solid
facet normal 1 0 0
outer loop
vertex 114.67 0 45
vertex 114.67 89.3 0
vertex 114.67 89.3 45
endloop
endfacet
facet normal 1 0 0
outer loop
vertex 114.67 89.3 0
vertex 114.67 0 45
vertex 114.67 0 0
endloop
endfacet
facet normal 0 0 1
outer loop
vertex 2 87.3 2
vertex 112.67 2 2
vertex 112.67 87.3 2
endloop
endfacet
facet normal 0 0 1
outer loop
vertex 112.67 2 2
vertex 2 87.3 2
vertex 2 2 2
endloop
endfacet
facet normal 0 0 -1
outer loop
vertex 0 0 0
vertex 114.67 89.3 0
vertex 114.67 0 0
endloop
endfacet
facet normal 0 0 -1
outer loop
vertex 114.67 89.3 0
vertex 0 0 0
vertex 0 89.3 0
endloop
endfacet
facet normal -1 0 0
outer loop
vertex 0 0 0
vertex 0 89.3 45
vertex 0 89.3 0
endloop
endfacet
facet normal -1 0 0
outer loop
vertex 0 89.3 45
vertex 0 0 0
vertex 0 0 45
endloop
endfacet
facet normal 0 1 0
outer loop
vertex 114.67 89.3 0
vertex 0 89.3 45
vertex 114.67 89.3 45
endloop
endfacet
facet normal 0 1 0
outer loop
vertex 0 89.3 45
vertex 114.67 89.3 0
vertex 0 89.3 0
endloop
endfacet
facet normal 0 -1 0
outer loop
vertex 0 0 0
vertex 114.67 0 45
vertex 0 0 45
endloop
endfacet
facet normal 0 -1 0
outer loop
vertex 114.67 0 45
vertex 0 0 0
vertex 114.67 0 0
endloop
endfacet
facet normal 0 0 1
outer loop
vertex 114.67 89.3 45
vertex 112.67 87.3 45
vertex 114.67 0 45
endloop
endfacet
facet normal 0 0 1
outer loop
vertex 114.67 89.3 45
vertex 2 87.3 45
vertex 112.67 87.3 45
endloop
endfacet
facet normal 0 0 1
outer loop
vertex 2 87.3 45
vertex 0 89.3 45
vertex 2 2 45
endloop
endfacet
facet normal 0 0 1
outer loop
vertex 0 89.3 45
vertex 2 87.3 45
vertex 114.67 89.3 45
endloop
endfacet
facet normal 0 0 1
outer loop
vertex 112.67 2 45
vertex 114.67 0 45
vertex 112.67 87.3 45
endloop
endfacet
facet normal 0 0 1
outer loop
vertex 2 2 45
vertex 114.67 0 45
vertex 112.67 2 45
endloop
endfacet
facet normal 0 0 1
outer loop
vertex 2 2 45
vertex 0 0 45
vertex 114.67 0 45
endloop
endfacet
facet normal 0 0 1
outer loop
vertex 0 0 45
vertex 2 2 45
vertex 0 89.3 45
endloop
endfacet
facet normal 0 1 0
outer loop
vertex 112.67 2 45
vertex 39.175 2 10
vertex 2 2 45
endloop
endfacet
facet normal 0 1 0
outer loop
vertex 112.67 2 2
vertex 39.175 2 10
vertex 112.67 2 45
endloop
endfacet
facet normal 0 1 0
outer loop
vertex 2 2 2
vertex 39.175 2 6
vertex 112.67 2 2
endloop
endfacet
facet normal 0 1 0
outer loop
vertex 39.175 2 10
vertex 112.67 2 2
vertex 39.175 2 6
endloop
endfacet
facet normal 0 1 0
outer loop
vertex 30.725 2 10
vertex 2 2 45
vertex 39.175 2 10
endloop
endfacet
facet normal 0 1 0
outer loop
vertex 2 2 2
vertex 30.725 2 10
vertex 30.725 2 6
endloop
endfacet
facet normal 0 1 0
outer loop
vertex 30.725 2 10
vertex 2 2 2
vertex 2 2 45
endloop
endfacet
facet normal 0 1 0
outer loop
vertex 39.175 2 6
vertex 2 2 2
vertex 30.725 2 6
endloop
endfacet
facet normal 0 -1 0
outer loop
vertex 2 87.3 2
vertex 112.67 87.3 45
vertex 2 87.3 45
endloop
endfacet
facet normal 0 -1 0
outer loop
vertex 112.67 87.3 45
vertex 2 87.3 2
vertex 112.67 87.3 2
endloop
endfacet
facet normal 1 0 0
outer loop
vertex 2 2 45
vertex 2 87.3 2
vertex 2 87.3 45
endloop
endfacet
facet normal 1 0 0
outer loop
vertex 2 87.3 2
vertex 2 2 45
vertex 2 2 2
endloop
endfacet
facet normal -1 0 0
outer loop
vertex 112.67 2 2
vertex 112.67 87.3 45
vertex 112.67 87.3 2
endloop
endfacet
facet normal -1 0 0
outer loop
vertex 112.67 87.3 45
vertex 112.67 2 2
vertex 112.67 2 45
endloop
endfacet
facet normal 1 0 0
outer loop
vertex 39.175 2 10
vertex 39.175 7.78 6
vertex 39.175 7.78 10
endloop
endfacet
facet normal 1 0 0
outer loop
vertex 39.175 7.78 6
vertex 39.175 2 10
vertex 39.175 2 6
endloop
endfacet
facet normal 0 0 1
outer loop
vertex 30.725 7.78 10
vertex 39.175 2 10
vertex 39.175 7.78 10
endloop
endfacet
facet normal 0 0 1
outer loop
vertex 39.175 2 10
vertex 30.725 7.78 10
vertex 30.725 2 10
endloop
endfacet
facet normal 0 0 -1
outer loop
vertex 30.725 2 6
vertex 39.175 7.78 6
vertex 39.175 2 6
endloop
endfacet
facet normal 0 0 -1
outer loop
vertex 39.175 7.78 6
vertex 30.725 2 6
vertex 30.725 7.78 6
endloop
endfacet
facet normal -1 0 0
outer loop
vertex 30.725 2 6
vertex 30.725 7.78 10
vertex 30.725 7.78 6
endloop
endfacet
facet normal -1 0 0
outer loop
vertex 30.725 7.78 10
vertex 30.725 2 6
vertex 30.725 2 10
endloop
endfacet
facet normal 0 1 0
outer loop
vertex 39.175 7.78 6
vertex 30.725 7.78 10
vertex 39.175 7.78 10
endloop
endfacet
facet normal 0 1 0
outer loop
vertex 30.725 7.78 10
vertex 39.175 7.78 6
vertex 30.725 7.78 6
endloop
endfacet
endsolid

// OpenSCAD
// file: ../settings/dimensions.scad
// Defualt Quality
$fn = 25;

// PCB Dimensions - mm
pcb_l = 109.67;
pcb_w = 84.30;
pcb_t = 1.6;

hole_dia = 3.2;
hole_x_spacing = 101.85;
hole_y_spacing = 76.10;

// PCB Component Locations - mm from center
usb_x = (-pcb_l/2) + 24.11;
usb_y = (-pcb_w/2);

uSD_x = (-pcb_l/2) + 42.46;
uSD_y = (-pcb_w/2) - 0.71;

// TMC2130 Dimensions - mm
tmc_l = 20.32;
tmc_w = 15.24;
tmc_t = 1.6;
tmc_offset_from_pcb = 11.05;
// main file
include <../settings/dimensions.scad>

case_height = 45;
wall_thickness = 2;

module main_body() {
    // base
    cube([pcb_l+5, pcb_w+5, wall_thickness]);

    // sides
    cube([pcb_l+5,wall_thickness,case_height]);
    translate([0,pcb_w+5-wall_thickness,0])cube([pcb_l+5,wall_thickness,case_height]);
    cube([wall_thickness,pcb_w+5,case_height]);
    translate([pcb_l+5-wall_thickness,0,0])cube([wall_thickness,pcb_w+5,case_height]);

    // USB puchout
    translate([-usb_x,0,wall_thickness+4])cube([8.45,7.78,wall_thickness+2]);

}

main_body();
